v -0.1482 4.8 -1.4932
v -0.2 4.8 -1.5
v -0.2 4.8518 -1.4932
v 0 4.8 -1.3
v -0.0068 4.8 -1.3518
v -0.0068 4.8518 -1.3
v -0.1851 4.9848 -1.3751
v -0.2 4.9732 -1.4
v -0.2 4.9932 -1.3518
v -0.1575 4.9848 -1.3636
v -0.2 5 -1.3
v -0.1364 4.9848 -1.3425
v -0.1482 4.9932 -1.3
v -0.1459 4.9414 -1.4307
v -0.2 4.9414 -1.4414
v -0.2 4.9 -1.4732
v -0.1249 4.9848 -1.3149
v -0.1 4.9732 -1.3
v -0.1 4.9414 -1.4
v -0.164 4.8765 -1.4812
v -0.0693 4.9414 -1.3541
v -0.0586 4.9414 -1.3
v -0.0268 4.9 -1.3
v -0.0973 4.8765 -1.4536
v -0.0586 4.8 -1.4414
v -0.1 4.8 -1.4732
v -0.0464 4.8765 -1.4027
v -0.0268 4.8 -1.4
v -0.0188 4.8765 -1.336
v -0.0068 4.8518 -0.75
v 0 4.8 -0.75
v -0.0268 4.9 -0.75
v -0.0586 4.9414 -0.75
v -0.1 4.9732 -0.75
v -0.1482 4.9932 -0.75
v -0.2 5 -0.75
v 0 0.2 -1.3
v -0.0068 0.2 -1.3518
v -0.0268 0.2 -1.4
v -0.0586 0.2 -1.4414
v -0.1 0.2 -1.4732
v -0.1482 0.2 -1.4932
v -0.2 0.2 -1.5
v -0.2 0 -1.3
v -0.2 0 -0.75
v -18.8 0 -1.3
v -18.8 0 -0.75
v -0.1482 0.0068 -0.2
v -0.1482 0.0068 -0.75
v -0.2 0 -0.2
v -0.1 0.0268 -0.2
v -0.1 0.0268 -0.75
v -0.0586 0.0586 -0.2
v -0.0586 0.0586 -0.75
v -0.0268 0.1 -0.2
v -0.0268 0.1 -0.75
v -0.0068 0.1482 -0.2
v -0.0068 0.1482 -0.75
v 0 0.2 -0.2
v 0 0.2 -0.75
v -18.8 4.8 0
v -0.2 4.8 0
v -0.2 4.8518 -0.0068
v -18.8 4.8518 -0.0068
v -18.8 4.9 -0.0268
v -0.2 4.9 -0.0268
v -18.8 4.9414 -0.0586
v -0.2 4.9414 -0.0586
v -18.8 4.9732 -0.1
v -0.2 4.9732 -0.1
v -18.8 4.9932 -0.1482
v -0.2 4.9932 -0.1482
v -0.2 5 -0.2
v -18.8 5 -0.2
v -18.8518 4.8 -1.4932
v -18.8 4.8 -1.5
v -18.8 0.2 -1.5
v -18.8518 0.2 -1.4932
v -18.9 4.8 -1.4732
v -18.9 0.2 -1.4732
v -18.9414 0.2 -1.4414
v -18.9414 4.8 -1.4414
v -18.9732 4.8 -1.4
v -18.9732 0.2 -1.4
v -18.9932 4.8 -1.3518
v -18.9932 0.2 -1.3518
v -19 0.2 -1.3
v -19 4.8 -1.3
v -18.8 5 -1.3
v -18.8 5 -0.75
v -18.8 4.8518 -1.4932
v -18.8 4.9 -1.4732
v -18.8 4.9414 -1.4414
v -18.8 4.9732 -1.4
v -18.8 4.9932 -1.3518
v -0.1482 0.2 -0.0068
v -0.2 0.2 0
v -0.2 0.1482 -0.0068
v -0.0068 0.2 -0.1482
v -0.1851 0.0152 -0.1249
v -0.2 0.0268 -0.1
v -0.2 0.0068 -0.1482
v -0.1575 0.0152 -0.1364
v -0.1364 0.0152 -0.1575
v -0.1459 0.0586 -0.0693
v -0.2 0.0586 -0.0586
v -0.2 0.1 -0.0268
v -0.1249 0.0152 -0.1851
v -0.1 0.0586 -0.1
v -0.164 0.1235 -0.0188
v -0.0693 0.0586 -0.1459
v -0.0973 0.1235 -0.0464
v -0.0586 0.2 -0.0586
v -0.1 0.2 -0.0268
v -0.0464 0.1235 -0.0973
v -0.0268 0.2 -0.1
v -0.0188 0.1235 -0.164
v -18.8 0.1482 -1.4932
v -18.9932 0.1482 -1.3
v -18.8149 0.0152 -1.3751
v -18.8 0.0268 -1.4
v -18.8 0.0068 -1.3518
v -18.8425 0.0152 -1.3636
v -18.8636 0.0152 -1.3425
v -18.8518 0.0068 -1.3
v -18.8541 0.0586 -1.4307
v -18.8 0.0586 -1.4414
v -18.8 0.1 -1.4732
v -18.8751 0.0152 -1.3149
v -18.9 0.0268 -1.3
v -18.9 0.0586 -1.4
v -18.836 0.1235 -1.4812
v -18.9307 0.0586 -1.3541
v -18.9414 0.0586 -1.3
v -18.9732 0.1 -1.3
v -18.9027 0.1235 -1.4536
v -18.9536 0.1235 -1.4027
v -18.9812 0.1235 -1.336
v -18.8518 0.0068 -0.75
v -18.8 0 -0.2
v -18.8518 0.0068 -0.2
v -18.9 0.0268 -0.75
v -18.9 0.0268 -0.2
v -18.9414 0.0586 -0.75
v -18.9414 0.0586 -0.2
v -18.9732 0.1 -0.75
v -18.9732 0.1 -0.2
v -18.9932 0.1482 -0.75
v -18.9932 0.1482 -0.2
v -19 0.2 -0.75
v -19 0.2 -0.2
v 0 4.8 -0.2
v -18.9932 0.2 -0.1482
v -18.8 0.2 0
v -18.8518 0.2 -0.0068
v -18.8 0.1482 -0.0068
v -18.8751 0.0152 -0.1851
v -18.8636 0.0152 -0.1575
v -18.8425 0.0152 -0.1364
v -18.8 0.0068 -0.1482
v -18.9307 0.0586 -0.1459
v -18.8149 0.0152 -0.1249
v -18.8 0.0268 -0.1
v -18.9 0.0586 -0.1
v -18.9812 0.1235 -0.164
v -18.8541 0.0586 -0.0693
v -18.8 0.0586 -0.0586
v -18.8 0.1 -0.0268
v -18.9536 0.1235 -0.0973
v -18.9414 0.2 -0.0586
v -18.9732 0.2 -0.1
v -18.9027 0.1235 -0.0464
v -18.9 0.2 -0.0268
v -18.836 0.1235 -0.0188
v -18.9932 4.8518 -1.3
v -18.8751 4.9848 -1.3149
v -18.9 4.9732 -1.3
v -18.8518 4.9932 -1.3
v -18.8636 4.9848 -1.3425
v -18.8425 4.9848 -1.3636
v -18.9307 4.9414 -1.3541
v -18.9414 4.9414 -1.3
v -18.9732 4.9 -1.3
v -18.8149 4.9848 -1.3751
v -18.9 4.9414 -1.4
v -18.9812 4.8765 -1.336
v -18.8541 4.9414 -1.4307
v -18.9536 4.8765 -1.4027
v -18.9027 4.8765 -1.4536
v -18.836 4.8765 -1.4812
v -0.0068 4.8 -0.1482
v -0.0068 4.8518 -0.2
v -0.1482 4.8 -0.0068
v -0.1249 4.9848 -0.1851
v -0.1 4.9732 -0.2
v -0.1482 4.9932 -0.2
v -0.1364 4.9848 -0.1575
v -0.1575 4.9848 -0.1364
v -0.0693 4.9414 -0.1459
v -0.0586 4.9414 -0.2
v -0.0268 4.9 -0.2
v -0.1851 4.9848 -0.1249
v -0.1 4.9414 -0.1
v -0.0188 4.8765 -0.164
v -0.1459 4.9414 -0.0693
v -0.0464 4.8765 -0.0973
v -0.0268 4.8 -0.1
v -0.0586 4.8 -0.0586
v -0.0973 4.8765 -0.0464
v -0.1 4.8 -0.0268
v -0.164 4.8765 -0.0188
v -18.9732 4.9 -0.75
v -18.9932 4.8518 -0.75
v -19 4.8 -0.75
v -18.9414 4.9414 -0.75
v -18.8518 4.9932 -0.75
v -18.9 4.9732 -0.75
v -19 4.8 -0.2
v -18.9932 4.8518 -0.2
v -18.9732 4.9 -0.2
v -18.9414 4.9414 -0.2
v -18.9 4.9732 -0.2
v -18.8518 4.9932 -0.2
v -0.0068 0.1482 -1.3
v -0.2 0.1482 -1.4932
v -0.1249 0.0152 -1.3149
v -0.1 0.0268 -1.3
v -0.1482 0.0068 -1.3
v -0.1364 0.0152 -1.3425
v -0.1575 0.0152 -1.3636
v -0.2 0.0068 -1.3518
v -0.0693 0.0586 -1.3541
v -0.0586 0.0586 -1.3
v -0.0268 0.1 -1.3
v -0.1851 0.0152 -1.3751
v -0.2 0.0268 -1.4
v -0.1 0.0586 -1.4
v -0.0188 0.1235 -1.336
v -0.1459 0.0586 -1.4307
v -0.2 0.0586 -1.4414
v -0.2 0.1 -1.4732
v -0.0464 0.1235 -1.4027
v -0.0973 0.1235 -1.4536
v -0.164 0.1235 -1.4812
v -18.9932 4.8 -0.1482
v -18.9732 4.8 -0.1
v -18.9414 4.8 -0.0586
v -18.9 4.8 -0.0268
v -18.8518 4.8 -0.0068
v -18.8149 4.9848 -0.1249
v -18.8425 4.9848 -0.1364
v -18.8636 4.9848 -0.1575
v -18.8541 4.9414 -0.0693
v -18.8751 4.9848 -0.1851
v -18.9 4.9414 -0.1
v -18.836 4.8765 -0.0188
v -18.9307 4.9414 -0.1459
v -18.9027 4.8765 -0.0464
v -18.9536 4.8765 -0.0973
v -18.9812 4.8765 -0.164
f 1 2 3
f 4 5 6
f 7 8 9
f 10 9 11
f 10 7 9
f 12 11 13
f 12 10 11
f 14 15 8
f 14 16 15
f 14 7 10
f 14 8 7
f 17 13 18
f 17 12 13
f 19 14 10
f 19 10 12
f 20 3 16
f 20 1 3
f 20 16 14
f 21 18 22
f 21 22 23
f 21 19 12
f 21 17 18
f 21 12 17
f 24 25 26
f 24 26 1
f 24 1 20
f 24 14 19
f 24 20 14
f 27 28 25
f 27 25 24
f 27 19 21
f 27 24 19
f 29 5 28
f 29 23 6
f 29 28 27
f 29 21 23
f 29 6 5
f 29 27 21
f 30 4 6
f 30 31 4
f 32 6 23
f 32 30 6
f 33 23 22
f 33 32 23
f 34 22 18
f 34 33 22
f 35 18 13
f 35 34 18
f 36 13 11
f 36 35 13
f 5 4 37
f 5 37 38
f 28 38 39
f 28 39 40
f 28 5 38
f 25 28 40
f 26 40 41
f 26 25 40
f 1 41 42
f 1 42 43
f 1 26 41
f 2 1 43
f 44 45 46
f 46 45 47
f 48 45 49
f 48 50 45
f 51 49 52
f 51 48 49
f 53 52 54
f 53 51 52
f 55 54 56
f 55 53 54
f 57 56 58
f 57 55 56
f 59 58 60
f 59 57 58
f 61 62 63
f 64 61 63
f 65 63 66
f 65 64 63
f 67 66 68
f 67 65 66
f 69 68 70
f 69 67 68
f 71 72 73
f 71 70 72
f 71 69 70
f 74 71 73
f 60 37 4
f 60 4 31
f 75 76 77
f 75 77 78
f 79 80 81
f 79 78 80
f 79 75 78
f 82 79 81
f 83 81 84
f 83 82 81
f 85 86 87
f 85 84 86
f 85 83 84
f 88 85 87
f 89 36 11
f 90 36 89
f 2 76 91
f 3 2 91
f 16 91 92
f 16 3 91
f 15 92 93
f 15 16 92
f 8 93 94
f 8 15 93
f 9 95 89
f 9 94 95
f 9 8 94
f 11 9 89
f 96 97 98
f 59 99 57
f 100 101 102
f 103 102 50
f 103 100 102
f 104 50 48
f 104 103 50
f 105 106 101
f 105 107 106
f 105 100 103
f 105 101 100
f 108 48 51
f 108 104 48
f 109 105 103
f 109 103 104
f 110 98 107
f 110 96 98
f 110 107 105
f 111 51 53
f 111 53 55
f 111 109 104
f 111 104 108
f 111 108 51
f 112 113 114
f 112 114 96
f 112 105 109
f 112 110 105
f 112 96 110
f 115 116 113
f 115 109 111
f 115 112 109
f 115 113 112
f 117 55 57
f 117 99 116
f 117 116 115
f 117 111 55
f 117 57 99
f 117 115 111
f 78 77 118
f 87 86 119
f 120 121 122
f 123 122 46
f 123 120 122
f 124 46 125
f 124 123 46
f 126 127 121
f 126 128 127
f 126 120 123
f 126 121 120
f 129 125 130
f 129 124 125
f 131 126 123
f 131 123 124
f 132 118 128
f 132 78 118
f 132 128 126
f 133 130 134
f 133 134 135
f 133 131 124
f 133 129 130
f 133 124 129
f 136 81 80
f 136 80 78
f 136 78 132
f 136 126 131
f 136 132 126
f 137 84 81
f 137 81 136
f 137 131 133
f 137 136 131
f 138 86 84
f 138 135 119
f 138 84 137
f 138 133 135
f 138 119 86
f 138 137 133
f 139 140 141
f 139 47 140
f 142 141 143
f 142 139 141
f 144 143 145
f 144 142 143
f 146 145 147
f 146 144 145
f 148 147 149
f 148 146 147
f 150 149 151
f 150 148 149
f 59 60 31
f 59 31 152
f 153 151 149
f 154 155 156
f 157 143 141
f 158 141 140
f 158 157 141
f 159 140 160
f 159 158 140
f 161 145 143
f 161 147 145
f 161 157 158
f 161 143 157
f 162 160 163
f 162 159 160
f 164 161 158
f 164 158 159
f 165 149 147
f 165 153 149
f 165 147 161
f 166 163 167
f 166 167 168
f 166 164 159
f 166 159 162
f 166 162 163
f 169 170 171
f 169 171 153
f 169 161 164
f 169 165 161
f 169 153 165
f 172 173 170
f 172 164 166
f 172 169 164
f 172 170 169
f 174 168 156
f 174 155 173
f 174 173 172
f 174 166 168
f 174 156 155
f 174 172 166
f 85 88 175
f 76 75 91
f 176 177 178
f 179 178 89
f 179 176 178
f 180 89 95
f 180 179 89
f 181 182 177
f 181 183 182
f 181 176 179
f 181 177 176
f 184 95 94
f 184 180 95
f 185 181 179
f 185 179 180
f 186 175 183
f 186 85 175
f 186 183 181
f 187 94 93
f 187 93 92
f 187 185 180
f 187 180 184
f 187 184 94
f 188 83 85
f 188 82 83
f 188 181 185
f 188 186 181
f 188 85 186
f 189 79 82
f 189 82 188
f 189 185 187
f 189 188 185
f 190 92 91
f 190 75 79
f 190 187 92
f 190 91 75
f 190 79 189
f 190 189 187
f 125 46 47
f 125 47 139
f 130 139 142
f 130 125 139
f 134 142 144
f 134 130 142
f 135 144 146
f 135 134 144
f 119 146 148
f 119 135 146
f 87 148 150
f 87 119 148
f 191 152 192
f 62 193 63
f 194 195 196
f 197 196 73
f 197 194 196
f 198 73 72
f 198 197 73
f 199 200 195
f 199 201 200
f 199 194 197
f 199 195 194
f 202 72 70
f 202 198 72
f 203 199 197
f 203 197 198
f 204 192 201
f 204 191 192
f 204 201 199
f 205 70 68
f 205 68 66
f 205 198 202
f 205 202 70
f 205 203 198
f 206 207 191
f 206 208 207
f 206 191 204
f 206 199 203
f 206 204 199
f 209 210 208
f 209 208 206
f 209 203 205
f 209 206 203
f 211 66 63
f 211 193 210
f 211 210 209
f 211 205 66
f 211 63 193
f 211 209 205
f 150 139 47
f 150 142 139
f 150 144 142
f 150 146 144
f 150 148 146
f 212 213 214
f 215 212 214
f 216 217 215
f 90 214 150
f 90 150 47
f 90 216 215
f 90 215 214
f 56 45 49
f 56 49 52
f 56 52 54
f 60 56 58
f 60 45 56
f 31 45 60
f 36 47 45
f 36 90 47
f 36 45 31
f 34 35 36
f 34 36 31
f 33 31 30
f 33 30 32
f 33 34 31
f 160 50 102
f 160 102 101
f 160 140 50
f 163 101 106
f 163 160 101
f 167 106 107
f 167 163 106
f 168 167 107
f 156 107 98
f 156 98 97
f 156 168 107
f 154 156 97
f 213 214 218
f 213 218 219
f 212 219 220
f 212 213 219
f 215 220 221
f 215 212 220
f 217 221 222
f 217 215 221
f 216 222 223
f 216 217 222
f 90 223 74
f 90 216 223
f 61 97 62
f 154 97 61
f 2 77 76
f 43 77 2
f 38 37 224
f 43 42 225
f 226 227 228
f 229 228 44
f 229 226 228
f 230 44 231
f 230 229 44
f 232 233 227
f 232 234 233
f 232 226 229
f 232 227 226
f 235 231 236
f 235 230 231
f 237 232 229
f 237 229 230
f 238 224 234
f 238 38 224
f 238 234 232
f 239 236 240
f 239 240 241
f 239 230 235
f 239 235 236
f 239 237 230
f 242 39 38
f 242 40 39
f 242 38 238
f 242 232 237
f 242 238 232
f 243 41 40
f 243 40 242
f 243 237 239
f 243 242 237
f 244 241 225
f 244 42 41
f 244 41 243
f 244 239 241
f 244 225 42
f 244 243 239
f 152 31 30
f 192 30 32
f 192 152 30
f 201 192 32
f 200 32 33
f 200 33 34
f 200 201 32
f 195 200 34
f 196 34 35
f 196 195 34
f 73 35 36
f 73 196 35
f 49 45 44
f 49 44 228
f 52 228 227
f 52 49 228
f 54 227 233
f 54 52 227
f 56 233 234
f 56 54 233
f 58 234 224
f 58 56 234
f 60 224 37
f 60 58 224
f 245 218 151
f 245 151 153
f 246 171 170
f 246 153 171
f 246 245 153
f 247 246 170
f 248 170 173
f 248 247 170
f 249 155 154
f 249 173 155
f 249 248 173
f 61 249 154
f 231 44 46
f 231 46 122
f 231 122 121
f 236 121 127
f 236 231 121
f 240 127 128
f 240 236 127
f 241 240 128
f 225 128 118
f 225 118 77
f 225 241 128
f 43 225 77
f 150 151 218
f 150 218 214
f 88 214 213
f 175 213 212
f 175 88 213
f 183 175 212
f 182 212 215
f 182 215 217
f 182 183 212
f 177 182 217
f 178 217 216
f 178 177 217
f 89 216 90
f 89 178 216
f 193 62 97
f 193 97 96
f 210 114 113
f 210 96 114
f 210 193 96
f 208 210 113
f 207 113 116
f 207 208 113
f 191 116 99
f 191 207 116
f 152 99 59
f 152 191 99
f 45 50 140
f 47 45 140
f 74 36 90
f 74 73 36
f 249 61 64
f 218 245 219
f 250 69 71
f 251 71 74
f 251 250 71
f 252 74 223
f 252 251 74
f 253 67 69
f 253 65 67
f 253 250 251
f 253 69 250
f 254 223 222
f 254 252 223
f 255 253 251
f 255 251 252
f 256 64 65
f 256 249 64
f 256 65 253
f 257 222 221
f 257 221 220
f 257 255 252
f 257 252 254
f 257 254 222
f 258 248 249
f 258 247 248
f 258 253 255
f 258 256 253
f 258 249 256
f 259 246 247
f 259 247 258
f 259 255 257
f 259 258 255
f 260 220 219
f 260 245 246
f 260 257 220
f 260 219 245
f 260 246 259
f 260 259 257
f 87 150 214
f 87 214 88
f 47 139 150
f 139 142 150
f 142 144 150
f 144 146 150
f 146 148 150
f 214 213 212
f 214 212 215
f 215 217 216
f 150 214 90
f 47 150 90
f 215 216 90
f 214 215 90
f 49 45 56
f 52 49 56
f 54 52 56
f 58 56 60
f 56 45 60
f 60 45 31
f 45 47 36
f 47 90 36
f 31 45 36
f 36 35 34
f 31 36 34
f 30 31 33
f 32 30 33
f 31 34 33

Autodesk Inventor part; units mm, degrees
ref_plane "YZ Plane" through (0, 0, 0) normal (1, 0, 0) x (0, 1, 0)
ref_plane "XZ Plane" through (0, 0, 0) normal (0, 1, 0) x (-1, 0, 0)
sketch "Sketch1" plane through (0, 0, 0) normal (0, 1, 0) x (-1, 0, 0)
  line L0 (0, 0) -> (19, 0)
  line L1 (19, 0) -> (19, -1.5)
  line L2 (19, -1.5) -> (0, -1.5)
  line L3 (0, -1.5) -> (0, 0)
  dimension "d0" = 19
  dimension "d1" = 1.5
extrude "Extrusion1" add sketch "Sketch1" along normal blind 5
fillet "Fillet1" radius 0.2 12 edges at (0, 2.5, 0) (0, 2.5, -1.5) (0, 0, -0.75) (0, 5, -0.75) (-19, 2.5, 0) (-9.5, 0, 0) (-9.5, 5, 0) (-19, 2.5, -1.5) (-19, 0, -0.75) (-19, 5, -0.75) (-9.5, 0, -1.5) (-9.5, 5, -1.5)
ref_plane "Work Plane1" through (-18.8, 0.2, -0.75) normal (0, 0, 1) x (1, 0, 0)
split body "Split1" result two bodies by plane through (-18.8, 0.2, -0.75) normal (0, 0, 1) first body at (-6.4, 1.6667, -0.25)
properties part number "Magnet"
